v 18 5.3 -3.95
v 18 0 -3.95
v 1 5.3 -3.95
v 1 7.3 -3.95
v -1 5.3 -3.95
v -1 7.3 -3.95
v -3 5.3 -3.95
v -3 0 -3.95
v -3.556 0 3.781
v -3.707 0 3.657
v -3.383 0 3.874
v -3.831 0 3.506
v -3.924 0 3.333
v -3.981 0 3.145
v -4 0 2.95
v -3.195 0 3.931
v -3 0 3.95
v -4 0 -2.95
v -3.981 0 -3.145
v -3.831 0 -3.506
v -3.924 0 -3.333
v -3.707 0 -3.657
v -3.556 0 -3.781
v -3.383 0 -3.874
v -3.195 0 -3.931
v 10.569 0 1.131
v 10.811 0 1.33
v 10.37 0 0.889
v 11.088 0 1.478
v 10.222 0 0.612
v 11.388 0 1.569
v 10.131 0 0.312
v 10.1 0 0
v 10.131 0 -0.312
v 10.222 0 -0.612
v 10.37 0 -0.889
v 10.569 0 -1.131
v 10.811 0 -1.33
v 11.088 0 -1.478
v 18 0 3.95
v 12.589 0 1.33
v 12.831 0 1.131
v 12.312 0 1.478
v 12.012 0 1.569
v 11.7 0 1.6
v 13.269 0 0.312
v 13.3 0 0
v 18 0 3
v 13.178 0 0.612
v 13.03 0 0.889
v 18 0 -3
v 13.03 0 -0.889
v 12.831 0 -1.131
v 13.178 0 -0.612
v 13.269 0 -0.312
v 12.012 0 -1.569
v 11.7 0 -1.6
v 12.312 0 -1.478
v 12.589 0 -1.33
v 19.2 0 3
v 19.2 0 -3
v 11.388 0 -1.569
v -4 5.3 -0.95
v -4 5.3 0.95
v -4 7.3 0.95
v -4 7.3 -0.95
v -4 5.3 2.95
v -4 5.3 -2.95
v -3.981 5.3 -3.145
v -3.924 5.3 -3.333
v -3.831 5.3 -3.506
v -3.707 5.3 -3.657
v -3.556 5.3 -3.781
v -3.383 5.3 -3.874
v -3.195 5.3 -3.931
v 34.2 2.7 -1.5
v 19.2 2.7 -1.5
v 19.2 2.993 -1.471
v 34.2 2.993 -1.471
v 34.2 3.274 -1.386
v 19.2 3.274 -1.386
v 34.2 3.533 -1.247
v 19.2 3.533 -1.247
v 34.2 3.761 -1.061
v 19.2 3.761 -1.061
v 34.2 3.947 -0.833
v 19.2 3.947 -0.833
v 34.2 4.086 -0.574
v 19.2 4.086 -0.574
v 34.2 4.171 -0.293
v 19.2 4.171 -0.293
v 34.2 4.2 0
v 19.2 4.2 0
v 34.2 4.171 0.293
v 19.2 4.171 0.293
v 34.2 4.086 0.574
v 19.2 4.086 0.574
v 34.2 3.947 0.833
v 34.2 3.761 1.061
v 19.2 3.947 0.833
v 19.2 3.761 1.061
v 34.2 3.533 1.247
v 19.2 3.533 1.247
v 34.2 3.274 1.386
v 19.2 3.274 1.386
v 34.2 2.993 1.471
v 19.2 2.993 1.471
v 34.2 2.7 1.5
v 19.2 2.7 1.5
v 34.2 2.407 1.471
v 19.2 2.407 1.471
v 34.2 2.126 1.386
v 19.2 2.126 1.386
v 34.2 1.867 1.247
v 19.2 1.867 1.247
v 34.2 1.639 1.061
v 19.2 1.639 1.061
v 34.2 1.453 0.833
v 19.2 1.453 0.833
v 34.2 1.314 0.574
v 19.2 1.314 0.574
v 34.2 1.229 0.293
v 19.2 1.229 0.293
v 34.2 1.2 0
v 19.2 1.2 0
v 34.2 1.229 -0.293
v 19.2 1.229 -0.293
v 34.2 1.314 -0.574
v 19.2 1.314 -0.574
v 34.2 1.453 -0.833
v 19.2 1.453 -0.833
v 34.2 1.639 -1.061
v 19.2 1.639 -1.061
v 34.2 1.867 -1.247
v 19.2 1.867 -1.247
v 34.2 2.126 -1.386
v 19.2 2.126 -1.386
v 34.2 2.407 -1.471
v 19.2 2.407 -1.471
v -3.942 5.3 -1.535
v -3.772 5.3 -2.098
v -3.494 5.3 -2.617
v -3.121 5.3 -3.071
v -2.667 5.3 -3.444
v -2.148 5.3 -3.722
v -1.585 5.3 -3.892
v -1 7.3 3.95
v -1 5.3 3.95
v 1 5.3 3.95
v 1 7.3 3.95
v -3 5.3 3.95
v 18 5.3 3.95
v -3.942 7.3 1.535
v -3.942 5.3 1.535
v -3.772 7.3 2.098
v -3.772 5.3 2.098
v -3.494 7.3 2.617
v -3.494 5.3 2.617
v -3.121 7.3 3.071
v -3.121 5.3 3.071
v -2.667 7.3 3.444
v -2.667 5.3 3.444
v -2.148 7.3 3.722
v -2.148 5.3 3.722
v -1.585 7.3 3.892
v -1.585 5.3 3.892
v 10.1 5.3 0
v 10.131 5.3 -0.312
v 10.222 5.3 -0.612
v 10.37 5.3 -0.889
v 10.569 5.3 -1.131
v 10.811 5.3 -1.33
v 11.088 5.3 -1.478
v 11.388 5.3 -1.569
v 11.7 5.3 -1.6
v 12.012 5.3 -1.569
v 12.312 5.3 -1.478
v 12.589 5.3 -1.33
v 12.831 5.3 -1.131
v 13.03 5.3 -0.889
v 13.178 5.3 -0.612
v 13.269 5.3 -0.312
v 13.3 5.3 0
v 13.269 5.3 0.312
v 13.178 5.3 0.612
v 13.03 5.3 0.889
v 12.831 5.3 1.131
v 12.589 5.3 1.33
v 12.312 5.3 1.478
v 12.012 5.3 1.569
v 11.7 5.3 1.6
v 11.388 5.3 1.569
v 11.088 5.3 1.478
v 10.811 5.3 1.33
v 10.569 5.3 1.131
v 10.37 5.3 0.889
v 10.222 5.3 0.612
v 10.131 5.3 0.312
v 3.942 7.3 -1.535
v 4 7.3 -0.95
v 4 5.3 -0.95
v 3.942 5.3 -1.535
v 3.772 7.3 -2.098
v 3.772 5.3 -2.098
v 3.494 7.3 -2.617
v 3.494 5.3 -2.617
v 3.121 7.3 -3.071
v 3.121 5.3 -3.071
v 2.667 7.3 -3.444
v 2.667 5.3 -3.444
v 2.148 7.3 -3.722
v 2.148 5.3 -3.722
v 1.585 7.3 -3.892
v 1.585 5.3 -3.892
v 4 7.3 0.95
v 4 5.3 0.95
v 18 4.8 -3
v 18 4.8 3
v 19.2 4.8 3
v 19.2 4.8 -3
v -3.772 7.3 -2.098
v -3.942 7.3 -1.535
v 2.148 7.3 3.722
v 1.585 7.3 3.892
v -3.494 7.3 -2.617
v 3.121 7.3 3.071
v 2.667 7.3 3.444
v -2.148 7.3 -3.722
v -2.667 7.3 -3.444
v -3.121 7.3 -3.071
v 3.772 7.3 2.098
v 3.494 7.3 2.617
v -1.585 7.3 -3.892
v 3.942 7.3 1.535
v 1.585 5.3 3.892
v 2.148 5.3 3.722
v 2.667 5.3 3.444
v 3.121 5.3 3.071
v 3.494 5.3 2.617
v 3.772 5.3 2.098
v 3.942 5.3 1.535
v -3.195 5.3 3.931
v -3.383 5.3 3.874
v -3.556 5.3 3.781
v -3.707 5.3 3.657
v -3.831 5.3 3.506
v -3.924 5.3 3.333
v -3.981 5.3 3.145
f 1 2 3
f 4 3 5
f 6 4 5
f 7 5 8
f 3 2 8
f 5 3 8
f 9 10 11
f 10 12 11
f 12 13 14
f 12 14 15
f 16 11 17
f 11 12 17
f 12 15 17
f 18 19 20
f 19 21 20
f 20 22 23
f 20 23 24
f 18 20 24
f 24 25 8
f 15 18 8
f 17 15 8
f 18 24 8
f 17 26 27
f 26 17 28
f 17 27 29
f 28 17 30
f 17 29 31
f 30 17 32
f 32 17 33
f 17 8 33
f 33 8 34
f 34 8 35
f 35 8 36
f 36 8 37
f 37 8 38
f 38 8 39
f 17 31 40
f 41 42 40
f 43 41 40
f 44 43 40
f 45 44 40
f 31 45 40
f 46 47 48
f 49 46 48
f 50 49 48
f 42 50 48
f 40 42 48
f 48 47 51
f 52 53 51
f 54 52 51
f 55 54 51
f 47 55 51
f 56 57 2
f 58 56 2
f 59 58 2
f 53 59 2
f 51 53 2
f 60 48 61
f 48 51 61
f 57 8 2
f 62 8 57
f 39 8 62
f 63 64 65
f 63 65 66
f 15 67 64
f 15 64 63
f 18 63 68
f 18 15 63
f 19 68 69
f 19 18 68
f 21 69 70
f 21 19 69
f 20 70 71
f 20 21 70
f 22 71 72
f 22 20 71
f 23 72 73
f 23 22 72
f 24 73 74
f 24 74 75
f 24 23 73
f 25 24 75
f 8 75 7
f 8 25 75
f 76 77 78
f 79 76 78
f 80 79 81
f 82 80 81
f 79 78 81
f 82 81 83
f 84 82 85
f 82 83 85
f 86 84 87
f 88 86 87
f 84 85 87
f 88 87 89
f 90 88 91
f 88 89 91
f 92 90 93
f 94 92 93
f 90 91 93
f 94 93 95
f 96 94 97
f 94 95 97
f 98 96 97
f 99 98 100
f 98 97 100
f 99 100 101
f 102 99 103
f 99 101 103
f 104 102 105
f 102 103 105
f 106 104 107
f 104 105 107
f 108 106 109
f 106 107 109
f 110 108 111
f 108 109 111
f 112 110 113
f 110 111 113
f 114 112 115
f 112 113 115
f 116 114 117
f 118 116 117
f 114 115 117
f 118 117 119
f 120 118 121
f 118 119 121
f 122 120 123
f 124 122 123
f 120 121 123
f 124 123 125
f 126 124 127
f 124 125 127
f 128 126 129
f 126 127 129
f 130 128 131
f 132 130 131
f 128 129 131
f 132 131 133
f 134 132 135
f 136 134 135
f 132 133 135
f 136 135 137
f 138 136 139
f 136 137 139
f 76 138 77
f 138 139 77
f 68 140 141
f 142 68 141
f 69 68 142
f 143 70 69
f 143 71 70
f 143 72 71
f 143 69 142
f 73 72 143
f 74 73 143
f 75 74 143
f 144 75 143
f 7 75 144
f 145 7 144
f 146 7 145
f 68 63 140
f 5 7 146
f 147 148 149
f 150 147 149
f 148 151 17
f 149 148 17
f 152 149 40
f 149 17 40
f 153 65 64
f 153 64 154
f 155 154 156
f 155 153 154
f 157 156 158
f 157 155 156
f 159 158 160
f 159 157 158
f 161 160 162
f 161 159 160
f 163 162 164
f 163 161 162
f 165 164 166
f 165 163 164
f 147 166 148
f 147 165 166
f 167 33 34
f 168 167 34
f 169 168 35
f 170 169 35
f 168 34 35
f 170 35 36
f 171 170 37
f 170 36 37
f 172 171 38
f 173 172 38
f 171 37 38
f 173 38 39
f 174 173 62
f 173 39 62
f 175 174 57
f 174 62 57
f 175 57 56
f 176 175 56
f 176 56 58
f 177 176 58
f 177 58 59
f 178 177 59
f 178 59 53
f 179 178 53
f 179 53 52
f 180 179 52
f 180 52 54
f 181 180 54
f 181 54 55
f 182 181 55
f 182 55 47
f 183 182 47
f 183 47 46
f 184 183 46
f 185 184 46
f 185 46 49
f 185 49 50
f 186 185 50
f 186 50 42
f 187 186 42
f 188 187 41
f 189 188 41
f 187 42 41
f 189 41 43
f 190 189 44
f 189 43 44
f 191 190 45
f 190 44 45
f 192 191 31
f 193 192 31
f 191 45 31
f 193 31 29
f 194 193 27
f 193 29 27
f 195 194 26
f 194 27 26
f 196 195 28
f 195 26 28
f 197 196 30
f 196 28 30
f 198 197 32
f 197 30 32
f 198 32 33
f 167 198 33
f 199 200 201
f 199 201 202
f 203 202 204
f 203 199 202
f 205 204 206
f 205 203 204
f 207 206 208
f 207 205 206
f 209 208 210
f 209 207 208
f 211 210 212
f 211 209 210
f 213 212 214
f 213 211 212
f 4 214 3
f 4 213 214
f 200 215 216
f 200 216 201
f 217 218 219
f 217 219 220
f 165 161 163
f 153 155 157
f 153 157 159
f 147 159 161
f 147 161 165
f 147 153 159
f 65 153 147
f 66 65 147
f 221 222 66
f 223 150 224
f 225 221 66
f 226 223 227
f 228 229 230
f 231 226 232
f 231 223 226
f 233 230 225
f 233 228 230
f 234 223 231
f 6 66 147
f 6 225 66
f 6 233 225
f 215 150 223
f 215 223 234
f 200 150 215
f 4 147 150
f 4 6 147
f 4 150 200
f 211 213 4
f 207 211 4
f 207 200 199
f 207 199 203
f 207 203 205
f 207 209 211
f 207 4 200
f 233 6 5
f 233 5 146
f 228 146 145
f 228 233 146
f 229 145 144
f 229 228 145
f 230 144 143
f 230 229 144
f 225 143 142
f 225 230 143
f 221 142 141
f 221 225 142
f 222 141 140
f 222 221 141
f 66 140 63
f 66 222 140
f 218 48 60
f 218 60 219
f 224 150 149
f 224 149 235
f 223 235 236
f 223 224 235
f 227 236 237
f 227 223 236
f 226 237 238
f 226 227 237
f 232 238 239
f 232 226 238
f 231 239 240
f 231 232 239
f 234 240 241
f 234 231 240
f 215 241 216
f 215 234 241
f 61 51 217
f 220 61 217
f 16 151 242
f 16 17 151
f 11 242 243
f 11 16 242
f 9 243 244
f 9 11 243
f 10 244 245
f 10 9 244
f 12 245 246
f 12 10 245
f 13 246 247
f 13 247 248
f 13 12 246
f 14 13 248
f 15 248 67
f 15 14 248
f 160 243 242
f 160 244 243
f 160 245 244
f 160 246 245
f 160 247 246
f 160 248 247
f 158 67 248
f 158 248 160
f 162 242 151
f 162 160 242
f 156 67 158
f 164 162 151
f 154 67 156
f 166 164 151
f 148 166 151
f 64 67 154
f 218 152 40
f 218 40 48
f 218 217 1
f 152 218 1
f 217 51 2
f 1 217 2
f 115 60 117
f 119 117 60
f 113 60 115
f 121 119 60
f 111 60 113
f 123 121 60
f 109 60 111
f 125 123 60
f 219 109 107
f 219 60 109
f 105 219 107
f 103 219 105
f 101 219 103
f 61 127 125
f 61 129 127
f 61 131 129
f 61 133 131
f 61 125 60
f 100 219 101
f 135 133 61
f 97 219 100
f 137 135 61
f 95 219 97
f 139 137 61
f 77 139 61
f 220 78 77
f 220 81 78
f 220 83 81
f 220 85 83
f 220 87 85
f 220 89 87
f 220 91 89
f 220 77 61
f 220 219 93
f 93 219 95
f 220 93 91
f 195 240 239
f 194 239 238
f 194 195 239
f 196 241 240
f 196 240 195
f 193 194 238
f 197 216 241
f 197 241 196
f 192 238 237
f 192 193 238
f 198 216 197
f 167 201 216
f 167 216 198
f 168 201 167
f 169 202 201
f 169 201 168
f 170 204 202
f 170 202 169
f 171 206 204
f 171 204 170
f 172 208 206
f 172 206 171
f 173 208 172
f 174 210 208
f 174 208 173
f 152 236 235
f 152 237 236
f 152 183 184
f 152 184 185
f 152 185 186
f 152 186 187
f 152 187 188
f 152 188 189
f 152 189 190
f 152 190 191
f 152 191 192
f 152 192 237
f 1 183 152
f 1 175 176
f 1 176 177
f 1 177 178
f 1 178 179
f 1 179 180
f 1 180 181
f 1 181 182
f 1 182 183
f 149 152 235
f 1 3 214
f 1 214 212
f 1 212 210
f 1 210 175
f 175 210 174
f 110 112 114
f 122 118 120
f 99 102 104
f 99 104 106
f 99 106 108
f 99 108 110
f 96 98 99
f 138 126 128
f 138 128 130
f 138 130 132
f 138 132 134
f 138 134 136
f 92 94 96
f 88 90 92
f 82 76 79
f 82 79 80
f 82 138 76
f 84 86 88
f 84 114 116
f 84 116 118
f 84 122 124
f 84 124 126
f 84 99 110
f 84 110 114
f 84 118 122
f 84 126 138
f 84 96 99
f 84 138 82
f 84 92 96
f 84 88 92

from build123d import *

# Parameters (mm, degrees)
ESQUISSE1_W             = 14
ESQUISSE1_H             = 7.9
ESQUISSE1_W_2           = 8
BOSS_EXTRU_1_DEPTH      = 5.3
ESQUISSE1_4_W           = 8
ESQUISSE1_4_H           = 7.9
BOSS_EXTRU_2_DEPTH      = 7.3
ESQUISSE2_OUTSIDE_W     = 28.898
ESQUISSE2_OUTSIDE_H     = 14.798
ENL_V_MAT_EXTRU_2_DEPTH = 2
D_GAGEMENT_M31_D        = 3.2
CONG_1_R                = 1
ESQUISSE5_W             = 6
ESQUISSE5_H             = 4.8
BOSS_EXTRU_3_DEPTH      = 1.2
ESQUISSE6_R             = 1.5
BOSS_EXTRU_4_DEPTH      = 15


with BuildPart() as part:
    # Esquisse1 → Boss.-Extru.1 (new body)
    with BuildSketch(Plane(origin=(0, 0, 0), x_dir=(1, 0, 0), z_dir=(0, 1, 0))):
        with Locations((11, 0)):
            Rectangle(ESQUISSE1_W, ESQUISSE1_H)
        Rectangle(ESQUISSE1_W_2, ESQUISSE1_H)
    extrude(amount=BOSS_EXTRU_1_DEPTH)

    # Esquisse1<4> → Boss.-Extru.2 (add)
    with BuildSketch(Plane(origin=(0, 0, 0), x_dir=(1, 0, 0), z_dir=(0, 1, 0))):
        Rectangle(ESQUISSE1_4_W, ESQUISSE1_4_H)
    extrude(amount=BOSS_EXTRU_2_DEPTH)

    # Esquisse2 outside → Enlèv. mat.-Extru.2 (cut)
    with BuildSketch(Plane(origin=(0, 7.3, 0), x_dir=(1, 0, 0), z_dir=(0, 1, 0))):
        with Locations((7, 0)):
            Rectangle(ESQUISSE2_OUTSIDE_W, ESQUISSE2_OUTSIDE_H)
        with BuildLine():
            Line((4, -0.95), (4, 0.95))
            ThreePointArc((4, 0.95), (3.121320344, 3.071320344), (1, 3.95))
            Line((1, 3.95), (-1, 3.95))
            ThreePointArc((-1, 3.95), (-3.121320344, 3.071320344), (-4, 0.95))
            Line((-4, 0.95), (-4, -0.95))
            ThreePointArc((-4, -0.95), (-3.121320344, -3.071320344), (-1, -3.95))
            Line((-1, -3.95), (1, -3.95))
            ThreePointArc((1, -3.95), (3.121320344, -3.071320344), (4, -0.95))
        make_face(mode=Mode.SUBTRACT)
    extrude(amount=-ENL_V_MAT_EXTRU_2_DEPTH, mode=Mode.SUBTRACT)

    # Dégagement M31 (through all)
    with Locations(Plane(origin=(0, 5.3, 0), x_dir=(1, 0, 0), z_dir=(0, 1, 0))):
        with Locations((11.7, 0)):
            Hole(D_GAGEMENT_M31_D / 2)

    # Congé1
    cong_1_edges = [part.edges().sort_by_distance(p)[0] for p in [
        (-4, 2.65, 3.95),
        (-4, 2.65, -3.95),
    ]]
    fillet(cong_1_edges, radius=CONG_1_R)

    # Esquisse5 → Boss.-Extru.3 (add)
    with BuildSketch(Plane(origin=(18, 0, 0), x_dir=(0, 0, -1), z_dir=(1, 0, 0))):
        with Locations((0, 2.4)):
            Rectangle(ESQUISSE5_W, ESQUISSE5_H)
    extrude(amount=BOSS_EXTRU_3_DEPTH)

    # Esquisse6 → Boss.-Extru.4 (add)
    with BuildSketch(Plane(origin=(19.2, 0, 0), x_dir=(0, 0, -1), z_dir=(1, 0, 0))):
        with Locations((0, 2.7)):
            Circle(ESQUISSE6_R)
    extrude(amount=BOSS_EXTRU_4_DEPTH)


solid = part.part
